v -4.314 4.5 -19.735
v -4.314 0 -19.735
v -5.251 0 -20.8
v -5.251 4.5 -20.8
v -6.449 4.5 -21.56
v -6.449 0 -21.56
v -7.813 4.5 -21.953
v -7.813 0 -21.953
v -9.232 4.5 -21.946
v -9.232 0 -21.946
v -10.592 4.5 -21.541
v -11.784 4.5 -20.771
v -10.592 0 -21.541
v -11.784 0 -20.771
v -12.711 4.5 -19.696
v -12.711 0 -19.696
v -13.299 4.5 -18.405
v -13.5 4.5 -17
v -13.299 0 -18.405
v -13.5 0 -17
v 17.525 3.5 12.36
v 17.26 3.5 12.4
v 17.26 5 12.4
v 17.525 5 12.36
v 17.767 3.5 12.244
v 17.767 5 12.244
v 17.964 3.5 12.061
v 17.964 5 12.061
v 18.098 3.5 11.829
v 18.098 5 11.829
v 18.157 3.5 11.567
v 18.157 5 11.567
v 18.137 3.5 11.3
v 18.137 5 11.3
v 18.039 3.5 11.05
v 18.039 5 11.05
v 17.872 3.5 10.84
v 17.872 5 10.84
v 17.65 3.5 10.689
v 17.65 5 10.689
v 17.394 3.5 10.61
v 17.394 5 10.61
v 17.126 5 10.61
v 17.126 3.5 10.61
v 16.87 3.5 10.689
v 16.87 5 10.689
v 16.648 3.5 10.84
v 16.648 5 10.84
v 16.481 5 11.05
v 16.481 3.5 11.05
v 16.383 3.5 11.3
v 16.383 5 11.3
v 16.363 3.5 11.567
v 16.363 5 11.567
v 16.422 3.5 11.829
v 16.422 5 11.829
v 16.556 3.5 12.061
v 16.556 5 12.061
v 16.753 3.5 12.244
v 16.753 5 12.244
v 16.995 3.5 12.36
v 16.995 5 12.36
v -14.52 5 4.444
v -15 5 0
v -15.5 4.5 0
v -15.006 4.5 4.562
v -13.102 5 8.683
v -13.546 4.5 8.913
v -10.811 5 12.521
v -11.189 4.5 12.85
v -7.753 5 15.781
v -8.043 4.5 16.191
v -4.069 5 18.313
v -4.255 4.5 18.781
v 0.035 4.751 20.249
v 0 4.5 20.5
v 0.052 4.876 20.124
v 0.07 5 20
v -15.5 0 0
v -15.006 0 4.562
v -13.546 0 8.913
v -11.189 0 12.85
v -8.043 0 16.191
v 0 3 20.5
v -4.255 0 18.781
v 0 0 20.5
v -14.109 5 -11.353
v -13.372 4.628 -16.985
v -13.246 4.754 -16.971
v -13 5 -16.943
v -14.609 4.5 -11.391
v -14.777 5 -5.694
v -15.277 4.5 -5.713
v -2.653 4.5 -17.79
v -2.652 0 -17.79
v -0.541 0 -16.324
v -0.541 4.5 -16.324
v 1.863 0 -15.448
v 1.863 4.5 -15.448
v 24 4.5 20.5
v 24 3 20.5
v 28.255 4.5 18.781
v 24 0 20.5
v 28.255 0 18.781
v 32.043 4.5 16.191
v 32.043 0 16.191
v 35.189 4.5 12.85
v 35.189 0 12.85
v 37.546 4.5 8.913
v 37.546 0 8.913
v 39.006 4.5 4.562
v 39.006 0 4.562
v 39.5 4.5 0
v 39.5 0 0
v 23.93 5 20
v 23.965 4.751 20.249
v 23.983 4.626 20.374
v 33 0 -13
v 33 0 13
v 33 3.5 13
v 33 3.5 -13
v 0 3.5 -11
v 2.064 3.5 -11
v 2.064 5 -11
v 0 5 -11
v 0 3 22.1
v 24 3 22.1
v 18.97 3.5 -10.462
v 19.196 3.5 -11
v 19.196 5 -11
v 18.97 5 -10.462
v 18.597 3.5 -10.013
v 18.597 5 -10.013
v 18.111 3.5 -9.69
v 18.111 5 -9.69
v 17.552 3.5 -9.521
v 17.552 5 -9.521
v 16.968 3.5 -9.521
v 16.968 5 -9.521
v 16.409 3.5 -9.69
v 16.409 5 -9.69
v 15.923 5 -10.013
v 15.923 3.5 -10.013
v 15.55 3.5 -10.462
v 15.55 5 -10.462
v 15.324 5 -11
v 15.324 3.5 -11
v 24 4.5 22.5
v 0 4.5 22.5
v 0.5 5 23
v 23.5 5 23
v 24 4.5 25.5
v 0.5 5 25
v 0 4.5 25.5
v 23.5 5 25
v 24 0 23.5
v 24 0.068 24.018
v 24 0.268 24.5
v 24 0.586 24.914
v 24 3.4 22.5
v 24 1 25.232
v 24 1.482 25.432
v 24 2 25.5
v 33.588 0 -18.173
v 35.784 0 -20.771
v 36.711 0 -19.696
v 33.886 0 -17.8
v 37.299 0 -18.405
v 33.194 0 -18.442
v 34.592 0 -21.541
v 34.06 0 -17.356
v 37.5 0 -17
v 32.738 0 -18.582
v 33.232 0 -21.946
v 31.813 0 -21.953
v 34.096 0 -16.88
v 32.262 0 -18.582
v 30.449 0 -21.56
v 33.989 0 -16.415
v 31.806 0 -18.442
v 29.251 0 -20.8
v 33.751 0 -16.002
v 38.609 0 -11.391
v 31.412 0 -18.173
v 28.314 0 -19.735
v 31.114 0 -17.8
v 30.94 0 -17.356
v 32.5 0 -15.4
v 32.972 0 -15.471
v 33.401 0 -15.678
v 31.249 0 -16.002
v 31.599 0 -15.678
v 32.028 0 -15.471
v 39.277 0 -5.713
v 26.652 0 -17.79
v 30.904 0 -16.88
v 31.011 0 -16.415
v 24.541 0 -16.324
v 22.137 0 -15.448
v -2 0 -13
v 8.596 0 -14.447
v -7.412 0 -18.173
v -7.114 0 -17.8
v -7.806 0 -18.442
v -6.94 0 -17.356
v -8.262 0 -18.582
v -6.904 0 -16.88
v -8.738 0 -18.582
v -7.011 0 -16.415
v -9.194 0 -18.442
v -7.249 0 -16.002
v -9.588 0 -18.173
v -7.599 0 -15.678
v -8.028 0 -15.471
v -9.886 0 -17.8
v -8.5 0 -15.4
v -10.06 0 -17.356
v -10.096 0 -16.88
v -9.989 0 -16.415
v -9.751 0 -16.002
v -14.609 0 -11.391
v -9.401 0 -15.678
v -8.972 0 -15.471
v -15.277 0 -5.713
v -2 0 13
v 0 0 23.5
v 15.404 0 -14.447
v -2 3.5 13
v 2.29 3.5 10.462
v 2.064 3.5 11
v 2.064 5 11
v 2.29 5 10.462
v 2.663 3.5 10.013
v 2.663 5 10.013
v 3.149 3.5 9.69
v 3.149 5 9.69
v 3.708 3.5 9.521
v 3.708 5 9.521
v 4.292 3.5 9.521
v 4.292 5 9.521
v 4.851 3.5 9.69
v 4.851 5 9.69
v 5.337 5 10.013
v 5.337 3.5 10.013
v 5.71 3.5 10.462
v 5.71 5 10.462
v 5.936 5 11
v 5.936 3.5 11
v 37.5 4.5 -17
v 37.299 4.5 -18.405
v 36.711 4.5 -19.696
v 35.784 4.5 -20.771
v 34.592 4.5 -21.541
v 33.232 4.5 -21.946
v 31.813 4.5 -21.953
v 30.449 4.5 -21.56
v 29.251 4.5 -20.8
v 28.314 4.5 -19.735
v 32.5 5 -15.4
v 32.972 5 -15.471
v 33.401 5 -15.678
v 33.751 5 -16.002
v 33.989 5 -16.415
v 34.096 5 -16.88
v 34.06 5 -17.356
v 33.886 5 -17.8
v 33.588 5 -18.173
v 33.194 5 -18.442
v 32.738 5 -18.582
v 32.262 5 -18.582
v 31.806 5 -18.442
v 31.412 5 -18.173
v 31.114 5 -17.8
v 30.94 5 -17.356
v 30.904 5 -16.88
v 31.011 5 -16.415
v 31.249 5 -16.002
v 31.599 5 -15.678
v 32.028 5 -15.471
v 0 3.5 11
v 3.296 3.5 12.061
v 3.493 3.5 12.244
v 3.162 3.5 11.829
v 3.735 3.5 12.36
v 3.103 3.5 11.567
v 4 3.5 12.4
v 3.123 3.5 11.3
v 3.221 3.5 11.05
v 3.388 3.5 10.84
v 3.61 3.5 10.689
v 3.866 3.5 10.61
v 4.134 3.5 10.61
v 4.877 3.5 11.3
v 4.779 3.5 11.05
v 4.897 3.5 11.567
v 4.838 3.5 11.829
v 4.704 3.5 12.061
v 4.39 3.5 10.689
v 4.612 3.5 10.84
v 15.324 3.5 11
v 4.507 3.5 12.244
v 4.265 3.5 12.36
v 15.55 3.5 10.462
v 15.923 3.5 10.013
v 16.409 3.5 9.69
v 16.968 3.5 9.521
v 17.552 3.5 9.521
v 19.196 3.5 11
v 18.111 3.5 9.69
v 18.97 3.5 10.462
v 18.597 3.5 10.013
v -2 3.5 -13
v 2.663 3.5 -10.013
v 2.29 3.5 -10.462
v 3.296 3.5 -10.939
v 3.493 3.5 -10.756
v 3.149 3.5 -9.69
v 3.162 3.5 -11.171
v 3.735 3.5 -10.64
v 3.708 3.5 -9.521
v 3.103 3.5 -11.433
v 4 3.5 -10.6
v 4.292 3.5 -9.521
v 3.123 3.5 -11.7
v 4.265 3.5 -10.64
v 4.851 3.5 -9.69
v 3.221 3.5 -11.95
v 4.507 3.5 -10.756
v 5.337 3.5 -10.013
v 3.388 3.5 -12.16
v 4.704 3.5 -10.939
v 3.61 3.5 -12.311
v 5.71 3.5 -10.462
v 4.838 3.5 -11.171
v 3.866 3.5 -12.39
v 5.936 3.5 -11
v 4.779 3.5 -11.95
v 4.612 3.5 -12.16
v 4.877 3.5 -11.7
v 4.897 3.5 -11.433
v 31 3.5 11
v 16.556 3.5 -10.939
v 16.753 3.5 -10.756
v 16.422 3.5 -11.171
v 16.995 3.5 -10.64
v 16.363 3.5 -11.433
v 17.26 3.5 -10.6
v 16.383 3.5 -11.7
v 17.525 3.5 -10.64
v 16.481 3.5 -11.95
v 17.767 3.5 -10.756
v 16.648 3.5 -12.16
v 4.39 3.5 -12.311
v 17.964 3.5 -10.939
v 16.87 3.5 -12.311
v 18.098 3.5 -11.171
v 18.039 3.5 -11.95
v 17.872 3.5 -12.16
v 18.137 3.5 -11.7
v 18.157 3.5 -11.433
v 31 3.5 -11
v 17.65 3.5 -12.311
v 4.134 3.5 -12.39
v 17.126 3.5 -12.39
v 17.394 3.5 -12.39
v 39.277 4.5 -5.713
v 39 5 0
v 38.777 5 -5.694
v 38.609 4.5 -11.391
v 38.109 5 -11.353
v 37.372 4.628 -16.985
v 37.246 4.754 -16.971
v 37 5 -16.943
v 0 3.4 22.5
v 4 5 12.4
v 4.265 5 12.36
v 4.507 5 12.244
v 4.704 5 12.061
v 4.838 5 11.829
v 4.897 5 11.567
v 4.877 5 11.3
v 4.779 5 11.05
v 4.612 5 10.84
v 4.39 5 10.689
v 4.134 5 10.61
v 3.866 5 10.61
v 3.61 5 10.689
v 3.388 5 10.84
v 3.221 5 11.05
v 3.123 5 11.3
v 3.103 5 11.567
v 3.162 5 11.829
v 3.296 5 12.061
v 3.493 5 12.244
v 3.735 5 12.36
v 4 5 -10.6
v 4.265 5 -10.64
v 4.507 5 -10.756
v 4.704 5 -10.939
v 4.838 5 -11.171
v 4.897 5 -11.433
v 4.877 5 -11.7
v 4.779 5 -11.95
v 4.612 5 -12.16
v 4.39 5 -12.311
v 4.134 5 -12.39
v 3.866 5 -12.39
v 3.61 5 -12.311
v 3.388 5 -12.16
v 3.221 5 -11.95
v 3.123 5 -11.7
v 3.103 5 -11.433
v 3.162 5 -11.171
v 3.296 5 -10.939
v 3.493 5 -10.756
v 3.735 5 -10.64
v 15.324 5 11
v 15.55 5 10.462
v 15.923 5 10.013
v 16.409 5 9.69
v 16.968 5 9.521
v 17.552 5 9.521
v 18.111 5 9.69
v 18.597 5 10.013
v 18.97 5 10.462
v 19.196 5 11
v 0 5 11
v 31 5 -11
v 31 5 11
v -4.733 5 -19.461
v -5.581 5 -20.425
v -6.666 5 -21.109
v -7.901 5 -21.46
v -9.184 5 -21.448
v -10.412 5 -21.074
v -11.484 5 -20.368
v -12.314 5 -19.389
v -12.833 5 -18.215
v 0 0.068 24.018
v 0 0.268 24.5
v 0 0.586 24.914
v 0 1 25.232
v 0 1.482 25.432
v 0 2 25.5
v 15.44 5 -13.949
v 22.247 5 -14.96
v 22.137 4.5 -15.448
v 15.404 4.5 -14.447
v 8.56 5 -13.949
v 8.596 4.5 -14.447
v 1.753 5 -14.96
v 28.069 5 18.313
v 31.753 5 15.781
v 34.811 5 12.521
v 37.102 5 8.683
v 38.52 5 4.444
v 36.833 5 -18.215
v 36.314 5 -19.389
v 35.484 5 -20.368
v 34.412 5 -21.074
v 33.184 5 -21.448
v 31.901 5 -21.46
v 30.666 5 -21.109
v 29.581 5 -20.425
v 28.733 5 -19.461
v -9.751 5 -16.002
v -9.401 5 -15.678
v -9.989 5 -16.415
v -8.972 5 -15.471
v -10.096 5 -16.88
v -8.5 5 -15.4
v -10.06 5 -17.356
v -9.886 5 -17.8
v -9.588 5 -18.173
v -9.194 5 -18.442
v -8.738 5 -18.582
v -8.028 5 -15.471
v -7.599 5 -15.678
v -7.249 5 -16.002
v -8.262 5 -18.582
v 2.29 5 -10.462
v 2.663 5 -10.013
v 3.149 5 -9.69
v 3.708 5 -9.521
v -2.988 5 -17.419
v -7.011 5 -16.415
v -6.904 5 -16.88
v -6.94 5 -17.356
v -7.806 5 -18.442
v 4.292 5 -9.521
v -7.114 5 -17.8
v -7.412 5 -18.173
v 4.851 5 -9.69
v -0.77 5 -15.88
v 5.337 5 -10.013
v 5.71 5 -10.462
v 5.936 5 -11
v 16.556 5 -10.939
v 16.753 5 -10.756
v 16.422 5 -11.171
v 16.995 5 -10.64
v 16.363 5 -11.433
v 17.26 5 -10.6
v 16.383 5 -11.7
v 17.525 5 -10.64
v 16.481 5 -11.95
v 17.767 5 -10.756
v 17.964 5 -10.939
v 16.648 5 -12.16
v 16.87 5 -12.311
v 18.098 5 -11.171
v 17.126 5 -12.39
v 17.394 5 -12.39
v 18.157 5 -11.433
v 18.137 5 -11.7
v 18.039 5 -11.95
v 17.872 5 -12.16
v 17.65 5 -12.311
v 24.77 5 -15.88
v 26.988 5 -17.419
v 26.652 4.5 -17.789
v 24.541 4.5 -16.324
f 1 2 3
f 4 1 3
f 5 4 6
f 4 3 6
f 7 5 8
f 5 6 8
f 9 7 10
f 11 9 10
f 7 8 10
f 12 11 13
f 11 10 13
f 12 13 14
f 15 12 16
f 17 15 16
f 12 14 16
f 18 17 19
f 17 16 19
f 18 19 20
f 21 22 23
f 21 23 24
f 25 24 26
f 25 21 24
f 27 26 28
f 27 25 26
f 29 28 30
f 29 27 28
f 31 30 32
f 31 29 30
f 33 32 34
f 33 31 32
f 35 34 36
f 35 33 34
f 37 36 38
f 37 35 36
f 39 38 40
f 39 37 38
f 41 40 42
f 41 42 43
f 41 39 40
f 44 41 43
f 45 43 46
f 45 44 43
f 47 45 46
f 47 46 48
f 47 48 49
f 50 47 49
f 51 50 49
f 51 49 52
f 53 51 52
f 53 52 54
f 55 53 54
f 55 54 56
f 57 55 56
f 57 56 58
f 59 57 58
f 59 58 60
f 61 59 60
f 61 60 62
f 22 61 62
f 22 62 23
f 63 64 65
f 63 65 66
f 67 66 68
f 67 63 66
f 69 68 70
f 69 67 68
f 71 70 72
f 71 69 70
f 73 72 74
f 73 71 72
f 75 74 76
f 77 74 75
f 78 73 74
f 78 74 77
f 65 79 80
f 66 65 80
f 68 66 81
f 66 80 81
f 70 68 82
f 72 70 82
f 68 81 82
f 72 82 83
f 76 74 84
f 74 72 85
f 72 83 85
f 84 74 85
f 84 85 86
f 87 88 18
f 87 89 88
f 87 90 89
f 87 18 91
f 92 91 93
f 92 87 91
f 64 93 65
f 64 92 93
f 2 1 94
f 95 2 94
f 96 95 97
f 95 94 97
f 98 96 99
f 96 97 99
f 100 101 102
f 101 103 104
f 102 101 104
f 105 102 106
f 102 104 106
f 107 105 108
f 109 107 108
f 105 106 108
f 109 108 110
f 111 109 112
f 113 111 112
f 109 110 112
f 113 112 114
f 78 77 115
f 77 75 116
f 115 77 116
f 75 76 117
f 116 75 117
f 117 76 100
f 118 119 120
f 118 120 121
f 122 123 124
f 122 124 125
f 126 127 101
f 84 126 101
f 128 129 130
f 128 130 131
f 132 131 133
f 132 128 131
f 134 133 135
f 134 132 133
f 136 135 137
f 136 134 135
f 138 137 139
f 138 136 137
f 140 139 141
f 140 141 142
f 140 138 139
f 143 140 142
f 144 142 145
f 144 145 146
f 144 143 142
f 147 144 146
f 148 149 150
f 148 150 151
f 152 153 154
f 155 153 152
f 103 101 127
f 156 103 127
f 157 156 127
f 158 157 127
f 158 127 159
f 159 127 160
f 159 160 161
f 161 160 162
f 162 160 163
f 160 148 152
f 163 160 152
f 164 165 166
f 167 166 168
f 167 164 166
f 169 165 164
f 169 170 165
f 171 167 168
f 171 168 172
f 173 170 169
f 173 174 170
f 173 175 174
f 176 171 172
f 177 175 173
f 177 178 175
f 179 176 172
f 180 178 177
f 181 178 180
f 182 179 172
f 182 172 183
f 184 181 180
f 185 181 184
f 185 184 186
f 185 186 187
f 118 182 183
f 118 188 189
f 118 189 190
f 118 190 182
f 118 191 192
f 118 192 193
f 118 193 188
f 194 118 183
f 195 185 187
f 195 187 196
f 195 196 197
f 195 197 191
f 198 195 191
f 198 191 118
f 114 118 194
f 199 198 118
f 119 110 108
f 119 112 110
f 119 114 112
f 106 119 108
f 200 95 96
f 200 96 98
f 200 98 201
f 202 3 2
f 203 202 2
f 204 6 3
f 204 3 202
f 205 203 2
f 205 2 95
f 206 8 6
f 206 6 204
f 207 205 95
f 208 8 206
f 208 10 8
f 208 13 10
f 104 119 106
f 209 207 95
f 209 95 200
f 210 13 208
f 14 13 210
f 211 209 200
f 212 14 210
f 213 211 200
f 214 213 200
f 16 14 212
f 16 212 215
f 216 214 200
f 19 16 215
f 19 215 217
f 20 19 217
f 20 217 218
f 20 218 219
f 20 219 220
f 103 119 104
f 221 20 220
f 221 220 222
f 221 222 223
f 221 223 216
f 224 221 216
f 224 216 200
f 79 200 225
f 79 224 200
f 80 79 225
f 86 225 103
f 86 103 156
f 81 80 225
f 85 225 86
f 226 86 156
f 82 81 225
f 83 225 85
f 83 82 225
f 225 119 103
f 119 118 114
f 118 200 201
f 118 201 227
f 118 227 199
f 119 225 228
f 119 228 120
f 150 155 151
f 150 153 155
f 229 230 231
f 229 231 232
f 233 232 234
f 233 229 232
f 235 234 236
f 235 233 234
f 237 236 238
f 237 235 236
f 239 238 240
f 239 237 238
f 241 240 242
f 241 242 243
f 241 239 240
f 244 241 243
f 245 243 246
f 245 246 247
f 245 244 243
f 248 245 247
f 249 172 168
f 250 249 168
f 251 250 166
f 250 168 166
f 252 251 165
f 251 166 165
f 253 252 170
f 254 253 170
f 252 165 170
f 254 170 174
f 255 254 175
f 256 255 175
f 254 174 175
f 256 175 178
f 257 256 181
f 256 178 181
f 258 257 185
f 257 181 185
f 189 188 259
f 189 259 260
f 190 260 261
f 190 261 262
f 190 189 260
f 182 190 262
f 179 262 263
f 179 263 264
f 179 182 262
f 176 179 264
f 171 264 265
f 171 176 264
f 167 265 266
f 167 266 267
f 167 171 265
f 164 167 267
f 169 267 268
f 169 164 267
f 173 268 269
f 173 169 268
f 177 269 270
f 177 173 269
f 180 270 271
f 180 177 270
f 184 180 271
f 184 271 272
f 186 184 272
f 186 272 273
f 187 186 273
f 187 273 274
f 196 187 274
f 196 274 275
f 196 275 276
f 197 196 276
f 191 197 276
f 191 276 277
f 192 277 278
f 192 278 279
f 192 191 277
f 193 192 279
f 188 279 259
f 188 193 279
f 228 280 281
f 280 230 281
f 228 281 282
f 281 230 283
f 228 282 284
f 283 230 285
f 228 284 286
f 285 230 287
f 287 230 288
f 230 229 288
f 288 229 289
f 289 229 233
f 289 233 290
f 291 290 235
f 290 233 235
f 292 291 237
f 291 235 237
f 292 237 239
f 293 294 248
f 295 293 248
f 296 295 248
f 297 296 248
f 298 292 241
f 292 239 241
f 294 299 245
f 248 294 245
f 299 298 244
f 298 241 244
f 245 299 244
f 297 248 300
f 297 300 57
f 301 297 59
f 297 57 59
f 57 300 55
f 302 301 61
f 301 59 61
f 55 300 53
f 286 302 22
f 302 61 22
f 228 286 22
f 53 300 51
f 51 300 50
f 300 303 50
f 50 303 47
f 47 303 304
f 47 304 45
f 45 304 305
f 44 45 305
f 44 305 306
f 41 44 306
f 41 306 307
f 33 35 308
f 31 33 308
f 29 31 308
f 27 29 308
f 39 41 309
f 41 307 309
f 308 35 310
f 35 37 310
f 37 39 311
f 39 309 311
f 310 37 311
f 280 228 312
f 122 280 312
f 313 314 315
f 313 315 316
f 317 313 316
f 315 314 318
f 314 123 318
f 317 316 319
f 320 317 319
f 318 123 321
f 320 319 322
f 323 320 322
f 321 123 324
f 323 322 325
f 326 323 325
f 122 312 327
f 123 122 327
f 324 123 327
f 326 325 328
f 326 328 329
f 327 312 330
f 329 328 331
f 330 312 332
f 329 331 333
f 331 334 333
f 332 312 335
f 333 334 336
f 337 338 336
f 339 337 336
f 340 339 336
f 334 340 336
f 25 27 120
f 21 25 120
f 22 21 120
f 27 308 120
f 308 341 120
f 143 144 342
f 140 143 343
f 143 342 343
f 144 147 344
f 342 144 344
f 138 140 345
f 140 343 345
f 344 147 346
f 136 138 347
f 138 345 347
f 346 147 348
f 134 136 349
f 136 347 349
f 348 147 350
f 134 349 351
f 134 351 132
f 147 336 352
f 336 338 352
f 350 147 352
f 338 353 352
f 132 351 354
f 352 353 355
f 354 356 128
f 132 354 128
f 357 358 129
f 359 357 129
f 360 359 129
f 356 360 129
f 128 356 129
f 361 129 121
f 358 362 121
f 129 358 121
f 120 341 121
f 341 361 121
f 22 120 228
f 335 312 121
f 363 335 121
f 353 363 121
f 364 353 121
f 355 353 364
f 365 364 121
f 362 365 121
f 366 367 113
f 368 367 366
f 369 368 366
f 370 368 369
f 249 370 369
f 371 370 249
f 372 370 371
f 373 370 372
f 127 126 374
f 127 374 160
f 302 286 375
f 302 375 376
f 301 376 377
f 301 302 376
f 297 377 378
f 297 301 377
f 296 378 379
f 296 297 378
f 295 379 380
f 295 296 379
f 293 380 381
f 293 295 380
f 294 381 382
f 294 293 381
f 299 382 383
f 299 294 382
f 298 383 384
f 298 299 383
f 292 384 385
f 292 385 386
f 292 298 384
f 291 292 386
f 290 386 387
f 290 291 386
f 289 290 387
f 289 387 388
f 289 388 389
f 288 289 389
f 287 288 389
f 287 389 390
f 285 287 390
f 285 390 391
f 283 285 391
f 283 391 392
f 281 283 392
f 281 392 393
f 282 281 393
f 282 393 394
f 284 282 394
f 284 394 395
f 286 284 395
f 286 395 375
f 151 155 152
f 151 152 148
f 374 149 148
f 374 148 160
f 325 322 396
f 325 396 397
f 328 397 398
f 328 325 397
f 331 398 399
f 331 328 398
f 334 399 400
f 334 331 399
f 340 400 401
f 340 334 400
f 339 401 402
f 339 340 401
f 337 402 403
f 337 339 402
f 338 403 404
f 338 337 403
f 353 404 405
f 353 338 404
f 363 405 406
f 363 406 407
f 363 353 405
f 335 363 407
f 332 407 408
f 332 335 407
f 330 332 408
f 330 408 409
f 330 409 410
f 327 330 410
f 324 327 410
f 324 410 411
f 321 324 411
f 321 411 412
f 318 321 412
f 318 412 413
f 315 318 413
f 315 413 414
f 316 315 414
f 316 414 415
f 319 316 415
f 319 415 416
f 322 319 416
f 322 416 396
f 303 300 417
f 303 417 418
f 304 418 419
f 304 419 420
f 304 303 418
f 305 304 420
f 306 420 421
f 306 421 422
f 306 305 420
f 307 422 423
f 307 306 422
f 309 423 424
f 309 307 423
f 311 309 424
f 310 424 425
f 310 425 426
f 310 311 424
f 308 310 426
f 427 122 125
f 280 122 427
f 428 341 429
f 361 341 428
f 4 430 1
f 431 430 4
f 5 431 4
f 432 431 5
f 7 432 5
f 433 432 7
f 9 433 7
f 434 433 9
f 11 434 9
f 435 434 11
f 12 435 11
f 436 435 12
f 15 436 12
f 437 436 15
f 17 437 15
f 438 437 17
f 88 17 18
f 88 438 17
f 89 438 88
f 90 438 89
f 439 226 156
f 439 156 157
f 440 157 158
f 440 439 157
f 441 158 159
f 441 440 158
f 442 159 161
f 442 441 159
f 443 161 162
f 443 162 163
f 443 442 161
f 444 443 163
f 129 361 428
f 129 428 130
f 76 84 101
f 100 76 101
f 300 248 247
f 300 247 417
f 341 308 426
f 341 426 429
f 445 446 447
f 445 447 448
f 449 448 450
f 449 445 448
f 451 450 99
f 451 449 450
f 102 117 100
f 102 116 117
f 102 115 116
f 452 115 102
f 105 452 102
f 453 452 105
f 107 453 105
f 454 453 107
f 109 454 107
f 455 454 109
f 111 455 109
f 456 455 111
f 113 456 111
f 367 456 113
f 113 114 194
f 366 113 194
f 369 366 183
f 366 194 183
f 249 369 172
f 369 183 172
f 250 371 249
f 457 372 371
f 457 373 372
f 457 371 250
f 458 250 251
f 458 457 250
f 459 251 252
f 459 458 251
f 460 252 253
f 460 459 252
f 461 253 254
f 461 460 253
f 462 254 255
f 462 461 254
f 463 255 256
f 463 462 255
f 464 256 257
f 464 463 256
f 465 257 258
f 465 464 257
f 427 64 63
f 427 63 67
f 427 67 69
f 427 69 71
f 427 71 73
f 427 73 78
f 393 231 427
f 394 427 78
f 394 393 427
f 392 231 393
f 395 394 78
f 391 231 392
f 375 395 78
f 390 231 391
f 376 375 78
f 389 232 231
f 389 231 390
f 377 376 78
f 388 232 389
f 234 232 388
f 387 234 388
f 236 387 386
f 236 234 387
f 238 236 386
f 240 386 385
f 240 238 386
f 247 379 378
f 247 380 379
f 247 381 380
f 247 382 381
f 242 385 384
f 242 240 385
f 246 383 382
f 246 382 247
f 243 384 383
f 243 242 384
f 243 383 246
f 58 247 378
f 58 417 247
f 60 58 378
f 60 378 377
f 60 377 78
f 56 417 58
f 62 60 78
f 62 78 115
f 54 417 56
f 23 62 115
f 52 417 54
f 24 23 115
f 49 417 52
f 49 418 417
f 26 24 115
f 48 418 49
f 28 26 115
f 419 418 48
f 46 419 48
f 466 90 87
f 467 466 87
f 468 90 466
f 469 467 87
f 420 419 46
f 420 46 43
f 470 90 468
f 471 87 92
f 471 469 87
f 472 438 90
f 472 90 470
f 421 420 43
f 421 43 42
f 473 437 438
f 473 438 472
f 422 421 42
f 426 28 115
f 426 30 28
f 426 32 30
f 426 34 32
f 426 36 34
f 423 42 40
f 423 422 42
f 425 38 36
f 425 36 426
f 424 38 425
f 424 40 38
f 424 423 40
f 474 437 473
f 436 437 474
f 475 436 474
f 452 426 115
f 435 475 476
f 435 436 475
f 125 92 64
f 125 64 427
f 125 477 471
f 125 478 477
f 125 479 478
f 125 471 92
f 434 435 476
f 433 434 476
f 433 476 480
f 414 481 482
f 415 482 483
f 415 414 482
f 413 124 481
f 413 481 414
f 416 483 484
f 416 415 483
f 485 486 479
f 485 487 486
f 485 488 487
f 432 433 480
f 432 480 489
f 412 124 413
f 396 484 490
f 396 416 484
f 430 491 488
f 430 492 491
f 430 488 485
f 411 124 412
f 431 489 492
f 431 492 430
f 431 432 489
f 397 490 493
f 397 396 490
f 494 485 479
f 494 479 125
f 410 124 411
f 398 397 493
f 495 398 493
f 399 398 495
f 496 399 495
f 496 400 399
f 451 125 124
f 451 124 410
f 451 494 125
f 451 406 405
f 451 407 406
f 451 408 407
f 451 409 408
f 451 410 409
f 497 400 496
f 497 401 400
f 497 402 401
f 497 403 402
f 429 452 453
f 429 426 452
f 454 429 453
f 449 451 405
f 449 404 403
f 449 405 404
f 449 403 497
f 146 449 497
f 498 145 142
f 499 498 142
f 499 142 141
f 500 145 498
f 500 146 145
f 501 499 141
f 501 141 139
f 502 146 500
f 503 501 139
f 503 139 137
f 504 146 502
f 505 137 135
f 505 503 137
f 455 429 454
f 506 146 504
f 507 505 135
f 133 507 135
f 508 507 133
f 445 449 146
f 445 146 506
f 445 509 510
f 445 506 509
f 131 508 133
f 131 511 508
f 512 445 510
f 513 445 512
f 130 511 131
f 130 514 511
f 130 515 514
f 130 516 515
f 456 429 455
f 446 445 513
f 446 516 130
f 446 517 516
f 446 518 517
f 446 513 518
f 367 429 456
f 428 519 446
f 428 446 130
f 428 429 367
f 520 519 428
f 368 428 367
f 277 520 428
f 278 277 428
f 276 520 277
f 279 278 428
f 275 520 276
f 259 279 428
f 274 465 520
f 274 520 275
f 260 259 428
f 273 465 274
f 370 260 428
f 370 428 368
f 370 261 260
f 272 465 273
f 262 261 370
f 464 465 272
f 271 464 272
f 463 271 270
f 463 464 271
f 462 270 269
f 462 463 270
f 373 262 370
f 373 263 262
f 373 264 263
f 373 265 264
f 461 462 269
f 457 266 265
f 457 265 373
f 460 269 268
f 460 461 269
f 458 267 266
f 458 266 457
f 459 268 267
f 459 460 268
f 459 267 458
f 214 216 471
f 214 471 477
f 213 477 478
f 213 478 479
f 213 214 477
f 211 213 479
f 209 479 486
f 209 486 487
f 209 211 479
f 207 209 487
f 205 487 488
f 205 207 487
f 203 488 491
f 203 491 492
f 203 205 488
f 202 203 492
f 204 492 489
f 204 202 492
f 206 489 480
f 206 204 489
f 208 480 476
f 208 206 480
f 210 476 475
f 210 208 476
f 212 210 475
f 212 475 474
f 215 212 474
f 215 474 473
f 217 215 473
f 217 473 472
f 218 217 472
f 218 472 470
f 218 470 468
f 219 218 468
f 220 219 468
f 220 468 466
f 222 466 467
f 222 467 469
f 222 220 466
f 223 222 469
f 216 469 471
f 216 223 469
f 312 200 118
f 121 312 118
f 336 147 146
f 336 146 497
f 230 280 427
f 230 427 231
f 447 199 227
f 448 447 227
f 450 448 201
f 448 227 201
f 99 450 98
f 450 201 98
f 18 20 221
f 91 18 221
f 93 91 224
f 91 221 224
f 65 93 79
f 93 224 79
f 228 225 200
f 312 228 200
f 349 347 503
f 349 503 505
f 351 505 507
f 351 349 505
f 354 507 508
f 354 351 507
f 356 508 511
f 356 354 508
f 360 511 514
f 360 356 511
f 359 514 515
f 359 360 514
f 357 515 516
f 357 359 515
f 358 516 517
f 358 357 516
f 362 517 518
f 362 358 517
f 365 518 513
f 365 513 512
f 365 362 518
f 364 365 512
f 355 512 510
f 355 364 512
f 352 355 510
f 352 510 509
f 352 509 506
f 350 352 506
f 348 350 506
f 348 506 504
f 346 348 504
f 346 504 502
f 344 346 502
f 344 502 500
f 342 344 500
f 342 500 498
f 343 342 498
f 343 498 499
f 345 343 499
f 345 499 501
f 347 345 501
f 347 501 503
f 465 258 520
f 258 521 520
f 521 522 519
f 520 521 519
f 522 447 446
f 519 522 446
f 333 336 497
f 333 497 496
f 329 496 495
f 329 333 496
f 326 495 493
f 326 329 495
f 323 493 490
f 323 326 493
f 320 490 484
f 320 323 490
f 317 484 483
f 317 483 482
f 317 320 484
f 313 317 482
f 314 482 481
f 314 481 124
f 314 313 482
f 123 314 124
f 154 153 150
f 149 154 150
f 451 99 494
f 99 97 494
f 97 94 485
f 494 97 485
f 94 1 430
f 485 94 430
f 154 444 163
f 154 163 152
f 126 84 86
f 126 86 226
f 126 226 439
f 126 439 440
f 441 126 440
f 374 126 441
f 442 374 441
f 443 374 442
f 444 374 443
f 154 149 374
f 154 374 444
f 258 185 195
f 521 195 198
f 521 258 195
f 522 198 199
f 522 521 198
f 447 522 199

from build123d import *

# Parameters (mm, degrees)
COMPLETE_SKETCH_R                   = 1.6
BODY_DEPTH                          = 5
SMOOTHING_FILLET_R                  = 10
CUT_EXTRUDE1_START                  = -5
SKETCH1_R                           = 0.9
CUT_EXTRUDE1_DEPTH                  = 5
CUT_EXTRUDE2_START                  = -5
SKETCH1_4_W                         = 35
SKETCH1_4_H                         = 26
CUT_EXTRUDE2_DEPTH                  = 3.5
BOSS_EXTRUDE1_DEPTH                 = 24
ELEPHANTSFOOT_COMPENSATION_TOP_SIZE = 0.5
CHAMFER1_SIZE                       = 0.4


with BuildPart() as part:
    # complete_sketch → body (new body)
    with BuildSketch(Plane(origin=(0, 0, 0), x_dir=(1, 0, 0), z_dir=(0, 1, 0))):
        with BuildLine():
            Line((0, -20.5), (24, -20.5))
            ThreePointArc((24, -20.5), (35.188838333, -12.850097276), (39.5, 0))
            ThreePointArc((39.5, 0), (38.998281767, 8.558621384), (37.5, 17))
            ThreePointArc((37.5, 17), (32.5, 22), (27.5, 17))
            ThreePointArc((27.5, 17), (12, 14.321592614), (-3.5, 17))
            ThreePointArc((-3.5, 17), (-8.5, 22), (-13.5, 17))
            ThreePointArc((-13.5, 17), (-14.998281767, 8.558621384), (-15.5, 0))
            ThreePointArc((-15.5, 0), (-11.188838333, -12.850097276), (0, -20.5))
        make_face()
        with Locations(Location((24, 0, 0), (0, 0, 270))):
            Circle(COMPLETE_SKETCH_R, mode=Mode.SUBTRACT)
        with Locations(Location((-8.5, 17, 0), (0, 0, 270))):
            Circle(COMPLETE_SKETCH_R, mode=Mode.SUBTRACT)
        with Locations(Location((32.5, 17, 0), (0, 0, 270))):
            Circle(COMPLETE_SKETCH_R, mode=Mode.SUBTRACT)
    extrude(amount=BODY_DEPTH)

    # smoothing_fillet
    smoothing_fillet_edges = [part.edges().sort_by_distance(p)[0] for p in [
        (-3.5, 2.5, -17),
        (27.5, 2.5, -17),
    ]]
    fillet(smoothing_fillet_edges, radius=SMOOTHING_FILLET_R)

    # Sketch1 → Cut-Extrude1 (cut)
    with BuildSketch(Plane(origin=(0, 5, 0), x_dir=(1, 0, 0), z_dir=(0, 1, 0)).offset(CUT_EXTRUDE1_START)):
        with BuildLine():
            Line((31, -11), (31, 11))
            Line((31, 11), (19.196491673, 11))
            ThreePointArc((19.196491673, 11), (17.26, 9.5), (15.323508327, 11))
            Line((15.323508327, 11), (5.936491673, 11))
            ThreePointArc((5.936491673, 11), (4, 9.5), (2.063508327, 11))
            Line((2.063508327, 11), (0, 11))
            Line((0, 11), (0, -11))
            Line((0, -11), (2.063508327, -11))
            ThreePointArc((2.063508327, -11), (4, -9.5), (5.936491673, -11))
            Line((5.936491673, -11), (15.323508327, -11))
            ThreePointArc((15.323508327, -11), (17.26, -9.5), (19.196491673, -11))
            Line((19.196491673, -11), (31, -11))
        make_face()
        with Locations(Location((4, 11.5, 0), (0, 0, 270))):
            Circle(SKETCH1_R)
        with Locations(Location((17.26, 11.5, 0), (0, 0, 270))):
            Circle(SKETCH1_R)
        with Locations(Location((17.26, -11.5, 0), (0, 0, 270))):
            Circle(SKETCH1_R)
        with Locations(Location((4, -11.5, 0), (0, 0, 270))):
            Circle(SKETCH1_R)
    extrude(amount=CUT_EXTRUDE1_DEPTH, mode=Mode.SUBTRACT)

    # Sketch1<4> → Cut-Extrude2 (cut)
    with BuildSketch(Plane(origin=(0, 5, 0), x_dir=(1, 0, 0), z_dir=(0, 1, 0)).offset(CUT_EXTRUDE2_START)):
        with Locations((15.5, 0)):
            Rectangle(SKETCH1_4_W, SKETCH1_4_H)
    extrude(amount=CUT_EXTRUDE2_DEPTH, mode=Mode.SUBTRACT)

    # Sketch2 → Boss-Extrude1 (add)
    with BuildSketch(Plane(origin=(0, 0, 0), x_dir=(0, 0, -1), z_dir=(1, 0, 0))):
        with BuildLine():
            Line((-20.5, 0), (-23.5, 0))
            ThreePointArc((-23.5, 0), (-24.914213562, 0.585786438), (-25.5, 2))
            Line((-25.5, 2), (-25.5, 5))
            Line((-25.5, 5), (-22.5, 5))
            Line((-22.5, 5), (-22.5, 3))
            Line((-22.5, 3), (-20.5, 3))
            Line((-20.5, 3), (-20.5, 0))
        make_face()
    extrude(amount=BOSS_EXTRUDE1_DEPTH)

    # elephantsfoot_compensation top
    elephantsfoot_compensation_top_edges = [part.edges().sort_by_distance(p)[0] for p in [
        (33.926618039, 5, -21.792156192),
        (25.643793964, 5, -16.988490587),
        (38.998281767, 5, -8.558621384),
        (12, 5, -14.321592614),
        (35.188838333, 5, 12.850097276),
        (-1.643793964, 5, -16.988490587),
        (12, 5, 20.5),
        (-9.926618039, 5, -21.792156192),
        (-11.188838333, 5, 12.850097276),
        (-14.998281767, 5, -8.558621384),
        (24, 5, 24),
        (0, 5, 24),
        (12, 5, 25.5),
        (12, 5, 22.5),
    ]]
    chamfer(elephantsfoot_compensation_top_edges, length=ELEPHANTSFOOT_COMPENSATION_TOP_SIZE)

    # Chamfer1
    chamfer1_edges = [part.edges().sort_by_distance(p)[0] for p in [
        (12, 3, 22.5),
    ]]
    chamfer(chamfer1_edges, length=CHAMFER1_SIZE)


solid = part.part
